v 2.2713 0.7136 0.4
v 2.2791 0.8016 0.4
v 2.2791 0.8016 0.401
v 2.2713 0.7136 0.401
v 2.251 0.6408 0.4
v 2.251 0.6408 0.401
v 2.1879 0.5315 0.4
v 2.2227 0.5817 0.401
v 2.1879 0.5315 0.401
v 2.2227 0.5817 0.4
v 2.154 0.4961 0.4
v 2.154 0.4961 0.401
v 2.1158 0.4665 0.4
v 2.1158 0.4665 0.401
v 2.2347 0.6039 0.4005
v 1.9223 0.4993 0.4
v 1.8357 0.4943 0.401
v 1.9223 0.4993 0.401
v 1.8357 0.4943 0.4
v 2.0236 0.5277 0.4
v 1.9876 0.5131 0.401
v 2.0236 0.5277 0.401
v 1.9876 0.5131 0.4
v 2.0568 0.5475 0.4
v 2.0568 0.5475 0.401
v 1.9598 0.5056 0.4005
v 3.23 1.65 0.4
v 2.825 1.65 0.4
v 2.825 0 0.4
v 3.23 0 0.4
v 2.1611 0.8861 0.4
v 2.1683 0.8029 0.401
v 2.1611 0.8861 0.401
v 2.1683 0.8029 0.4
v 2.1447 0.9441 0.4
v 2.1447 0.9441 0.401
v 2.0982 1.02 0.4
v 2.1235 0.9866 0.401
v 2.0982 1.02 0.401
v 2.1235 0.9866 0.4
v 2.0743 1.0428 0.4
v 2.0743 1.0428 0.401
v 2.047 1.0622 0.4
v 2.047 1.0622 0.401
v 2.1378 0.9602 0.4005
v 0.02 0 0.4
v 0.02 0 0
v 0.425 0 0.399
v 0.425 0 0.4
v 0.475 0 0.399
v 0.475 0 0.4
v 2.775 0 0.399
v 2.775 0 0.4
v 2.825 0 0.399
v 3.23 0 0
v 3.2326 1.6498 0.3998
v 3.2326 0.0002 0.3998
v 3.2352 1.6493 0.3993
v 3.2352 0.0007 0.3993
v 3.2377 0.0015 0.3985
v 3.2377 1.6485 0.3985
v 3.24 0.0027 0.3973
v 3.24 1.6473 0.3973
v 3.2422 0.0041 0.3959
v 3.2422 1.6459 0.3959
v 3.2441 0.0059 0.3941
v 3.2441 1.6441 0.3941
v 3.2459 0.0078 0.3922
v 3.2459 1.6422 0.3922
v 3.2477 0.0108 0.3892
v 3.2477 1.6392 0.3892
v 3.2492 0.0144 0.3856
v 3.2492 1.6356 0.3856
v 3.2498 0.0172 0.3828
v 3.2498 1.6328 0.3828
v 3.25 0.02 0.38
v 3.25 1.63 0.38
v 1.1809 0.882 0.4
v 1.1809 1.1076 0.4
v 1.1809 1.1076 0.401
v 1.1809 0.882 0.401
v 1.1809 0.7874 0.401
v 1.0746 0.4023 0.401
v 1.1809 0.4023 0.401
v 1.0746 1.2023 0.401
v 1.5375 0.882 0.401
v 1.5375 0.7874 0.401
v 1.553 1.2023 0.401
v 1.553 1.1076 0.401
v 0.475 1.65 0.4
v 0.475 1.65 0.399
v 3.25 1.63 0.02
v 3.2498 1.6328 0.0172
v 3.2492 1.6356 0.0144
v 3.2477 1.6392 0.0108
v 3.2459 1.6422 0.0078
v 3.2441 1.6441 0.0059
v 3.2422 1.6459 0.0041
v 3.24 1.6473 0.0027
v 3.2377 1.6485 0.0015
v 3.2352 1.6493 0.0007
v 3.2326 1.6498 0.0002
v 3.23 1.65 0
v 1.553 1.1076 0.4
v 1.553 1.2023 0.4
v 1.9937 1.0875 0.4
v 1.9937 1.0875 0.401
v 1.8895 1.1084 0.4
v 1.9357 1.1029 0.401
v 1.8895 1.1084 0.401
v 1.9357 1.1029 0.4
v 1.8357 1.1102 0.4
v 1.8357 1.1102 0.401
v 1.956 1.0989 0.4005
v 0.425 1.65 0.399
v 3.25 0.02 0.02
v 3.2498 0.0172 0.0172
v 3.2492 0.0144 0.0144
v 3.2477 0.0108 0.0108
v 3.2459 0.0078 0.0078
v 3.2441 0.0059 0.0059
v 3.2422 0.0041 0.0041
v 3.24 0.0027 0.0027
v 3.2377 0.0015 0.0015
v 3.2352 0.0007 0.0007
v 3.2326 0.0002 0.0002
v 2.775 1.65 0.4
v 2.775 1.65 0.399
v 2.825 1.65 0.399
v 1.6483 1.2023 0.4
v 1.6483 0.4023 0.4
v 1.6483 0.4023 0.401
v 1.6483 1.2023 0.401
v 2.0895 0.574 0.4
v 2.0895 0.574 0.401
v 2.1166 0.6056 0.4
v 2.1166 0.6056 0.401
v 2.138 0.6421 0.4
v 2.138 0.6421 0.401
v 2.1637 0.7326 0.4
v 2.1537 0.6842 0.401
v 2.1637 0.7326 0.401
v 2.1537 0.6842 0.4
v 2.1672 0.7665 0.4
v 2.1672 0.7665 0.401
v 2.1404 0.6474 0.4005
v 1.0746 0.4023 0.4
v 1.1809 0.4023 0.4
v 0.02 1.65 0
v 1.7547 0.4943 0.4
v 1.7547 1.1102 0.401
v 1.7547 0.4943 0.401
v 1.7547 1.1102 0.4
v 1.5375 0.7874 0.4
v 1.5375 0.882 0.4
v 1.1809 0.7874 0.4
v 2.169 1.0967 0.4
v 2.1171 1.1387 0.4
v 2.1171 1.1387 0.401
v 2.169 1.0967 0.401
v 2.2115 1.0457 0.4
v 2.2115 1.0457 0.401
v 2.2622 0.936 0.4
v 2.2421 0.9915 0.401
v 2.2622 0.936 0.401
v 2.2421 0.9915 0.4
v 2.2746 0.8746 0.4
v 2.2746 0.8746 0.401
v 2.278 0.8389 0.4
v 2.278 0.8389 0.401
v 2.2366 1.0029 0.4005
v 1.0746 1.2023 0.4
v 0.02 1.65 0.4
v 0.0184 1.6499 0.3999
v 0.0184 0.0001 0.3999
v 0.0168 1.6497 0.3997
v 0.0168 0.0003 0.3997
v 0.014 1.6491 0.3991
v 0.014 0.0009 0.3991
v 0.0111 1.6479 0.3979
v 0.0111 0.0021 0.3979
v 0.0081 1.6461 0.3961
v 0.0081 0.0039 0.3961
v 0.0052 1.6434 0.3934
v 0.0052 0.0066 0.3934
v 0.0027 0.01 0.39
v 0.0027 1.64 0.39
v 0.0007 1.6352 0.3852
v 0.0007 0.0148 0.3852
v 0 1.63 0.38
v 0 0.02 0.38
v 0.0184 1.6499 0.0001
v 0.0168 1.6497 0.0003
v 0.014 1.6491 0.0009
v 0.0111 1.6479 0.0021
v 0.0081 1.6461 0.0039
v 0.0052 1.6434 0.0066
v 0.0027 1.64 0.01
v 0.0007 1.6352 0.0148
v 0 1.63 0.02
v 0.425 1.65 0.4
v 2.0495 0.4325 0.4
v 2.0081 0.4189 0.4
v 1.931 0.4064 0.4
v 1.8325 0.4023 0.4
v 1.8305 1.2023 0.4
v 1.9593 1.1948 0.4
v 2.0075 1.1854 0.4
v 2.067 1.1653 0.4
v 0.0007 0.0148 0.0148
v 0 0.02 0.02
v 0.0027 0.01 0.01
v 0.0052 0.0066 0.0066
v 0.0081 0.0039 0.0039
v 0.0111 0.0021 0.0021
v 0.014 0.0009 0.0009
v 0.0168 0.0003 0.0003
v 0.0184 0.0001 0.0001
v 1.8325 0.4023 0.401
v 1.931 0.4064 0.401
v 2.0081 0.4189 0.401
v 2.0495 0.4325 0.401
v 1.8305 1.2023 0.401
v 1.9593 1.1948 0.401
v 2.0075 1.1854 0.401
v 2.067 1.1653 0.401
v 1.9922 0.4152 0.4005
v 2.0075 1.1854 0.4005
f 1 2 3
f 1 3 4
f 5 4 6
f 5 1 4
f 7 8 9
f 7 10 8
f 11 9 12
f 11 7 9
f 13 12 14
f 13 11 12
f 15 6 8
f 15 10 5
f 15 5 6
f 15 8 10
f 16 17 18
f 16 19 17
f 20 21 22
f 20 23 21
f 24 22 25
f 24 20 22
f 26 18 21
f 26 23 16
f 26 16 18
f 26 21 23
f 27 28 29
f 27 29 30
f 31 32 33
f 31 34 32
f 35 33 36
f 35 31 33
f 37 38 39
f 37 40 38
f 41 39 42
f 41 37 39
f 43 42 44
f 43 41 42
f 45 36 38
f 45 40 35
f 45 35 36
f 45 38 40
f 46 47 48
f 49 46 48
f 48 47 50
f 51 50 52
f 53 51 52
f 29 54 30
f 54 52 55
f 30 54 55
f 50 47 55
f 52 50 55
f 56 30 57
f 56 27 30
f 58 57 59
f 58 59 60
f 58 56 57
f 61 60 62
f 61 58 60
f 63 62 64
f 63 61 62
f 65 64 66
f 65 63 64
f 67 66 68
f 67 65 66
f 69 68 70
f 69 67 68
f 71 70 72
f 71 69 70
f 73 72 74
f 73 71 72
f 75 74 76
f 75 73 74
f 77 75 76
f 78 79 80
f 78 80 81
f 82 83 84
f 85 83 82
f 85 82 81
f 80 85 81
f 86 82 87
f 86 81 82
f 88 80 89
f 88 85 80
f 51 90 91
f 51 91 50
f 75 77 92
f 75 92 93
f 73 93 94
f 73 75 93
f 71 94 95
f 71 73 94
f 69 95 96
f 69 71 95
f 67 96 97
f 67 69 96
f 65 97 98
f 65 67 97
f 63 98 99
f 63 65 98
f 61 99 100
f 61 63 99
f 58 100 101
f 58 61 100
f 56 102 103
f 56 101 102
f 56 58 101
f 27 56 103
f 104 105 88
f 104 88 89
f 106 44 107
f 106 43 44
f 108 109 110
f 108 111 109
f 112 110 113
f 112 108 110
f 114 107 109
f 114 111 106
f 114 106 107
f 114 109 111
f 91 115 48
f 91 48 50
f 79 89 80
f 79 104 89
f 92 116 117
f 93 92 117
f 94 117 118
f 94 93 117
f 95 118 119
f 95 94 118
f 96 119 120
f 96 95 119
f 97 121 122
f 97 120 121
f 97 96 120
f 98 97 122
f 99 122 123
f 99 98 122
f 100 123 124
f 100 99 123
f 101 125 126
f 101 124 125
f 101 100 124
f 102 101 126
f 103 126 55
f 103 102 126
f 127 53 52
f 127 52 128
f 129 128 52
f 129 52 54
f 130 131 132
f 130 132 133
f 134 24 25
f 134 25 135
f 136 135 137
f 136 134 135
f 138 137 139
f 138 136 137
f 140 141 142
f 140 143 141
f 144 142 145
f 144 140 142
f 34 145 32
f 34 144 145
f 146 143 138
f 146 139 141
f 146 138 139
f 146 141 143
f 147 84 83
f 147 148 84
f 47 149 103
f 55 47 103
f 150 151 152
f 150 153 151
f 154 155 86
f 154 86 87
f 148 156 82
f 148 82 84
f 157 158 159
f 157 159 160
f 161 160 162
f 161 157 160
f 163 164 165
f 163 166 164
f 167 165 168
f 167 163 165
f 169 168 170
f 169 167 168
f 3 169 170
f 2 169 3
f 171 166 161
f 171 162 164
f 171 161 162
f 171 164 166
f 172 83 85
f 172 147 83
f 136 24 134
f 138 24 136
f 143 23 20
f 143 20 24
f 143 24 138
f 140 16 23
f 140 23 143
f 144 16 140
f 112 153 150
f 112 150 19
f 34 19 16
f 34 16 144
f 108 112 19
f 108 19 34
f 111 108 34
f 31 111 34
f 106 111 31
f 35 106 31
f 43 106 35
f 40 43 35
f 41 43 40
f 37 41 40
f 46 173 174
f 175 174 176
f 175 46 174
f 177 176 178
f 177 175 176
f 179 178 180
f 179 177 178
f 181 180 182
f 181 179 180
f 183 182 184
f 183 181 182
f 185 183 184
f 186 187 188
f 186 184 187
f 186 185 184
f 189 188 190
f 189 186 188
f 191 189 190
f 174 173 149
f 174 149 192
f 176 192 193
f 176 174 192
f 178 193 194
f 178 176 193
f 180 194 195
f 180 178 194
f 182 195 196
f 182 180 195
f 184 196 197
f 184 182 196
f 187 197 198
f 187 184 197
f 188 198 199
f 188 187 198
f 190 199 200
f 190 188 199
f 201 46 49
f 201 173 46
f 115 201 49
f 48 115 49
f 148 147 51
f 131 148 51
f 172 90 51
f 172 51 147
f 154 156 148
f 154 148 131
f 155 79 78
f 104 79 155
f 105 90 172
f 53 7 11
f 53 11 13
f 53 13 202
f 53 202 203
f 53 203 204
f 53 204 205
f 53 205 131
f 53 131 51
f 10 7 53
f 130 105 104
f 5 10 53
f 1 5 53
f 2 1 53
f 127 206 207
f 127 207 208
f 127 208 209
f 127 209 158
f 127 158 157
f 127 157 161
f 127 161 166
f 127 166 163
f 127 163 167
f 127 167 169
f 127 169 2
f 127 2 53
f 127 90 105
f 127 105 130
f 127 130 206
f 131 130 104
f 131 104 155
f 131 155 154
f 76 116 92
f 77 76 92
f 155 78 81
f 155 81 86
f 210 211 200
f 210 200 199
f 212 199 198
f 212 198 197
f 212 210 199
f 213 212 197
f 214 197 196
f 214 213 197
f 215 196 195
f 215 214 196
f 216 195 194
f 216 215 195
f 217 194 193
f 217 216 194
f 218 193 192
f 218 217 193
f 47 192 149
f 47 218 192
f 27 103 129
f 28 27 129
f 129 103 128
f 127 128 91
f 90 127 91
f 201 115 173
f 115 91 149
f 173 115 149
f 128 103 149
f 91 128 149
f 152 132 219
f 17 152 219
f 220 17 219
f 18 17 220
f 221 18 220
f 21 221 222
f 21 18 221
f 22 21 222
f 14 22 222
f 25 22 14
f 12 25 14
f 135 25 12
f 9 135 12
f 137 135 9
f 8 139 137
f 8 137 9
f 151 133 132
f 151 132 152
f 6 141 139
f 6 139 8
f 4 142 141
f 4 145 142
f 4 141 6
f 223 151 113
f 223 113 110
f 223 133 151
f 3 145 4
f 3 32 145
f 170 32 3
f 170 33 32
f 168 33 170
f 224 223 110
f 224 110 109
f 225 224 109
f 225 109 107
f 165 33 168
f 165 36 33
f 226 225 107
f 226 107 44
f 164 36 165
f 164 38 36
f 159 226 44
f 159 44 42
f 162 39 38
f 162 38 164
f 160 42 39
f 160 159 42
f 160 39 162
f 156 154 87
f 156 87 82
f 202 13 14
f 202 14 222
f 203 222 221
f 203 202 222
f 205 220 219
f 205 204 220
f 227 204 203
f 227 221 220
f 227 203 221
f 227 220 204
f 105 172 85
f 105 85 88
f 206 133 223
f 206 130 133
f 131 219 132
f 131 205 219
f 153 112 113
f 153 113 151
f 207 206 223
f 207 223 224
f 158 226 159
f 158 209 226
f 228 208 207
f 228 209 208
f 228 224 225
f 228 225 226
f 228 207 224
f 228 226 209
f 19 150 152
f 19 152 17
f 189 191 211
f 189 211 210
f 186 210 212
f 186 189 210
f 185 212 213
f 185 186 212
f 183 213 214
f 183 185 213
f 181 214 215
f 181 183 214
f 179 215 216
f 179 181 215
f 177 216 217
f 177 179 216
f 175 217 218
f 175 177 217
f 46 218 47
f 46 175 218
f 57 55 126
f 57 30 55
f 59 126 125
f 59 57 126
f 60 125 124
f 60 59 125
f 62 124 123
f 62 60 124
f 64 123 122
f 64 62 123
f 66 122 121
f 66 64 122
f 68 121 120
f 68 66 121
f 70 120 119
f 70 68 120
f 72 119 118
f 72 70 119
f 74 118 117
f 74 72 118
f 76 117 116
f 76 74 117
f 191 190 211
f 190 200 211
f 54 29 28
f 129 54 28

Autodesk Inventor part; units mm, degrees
ref_plane "YZ Plane" through (0, 0, 0) normal (1, 0, 0) x (0, 1, 0)
ref_plane "XZ Plane" through (0, 0, 0) normal (0, 1, 0) x (-1, 0, 0)
ref_plane "XY Plane" through (0, 0, 0) normal (0, 0, 1) x (1, 0, 0)
sketch "Sketch1" plane through (0, 0, 0) normal (0, 0, 1) x (1, 0, 0)
  line L0 (0, 0) -> (3.25, 0)
  line L1 (3.25, 0) -> (3.25, 1.65)
  line L2 (3.25, 1.65) -> (0, 1.65)
  line L3 (0, 1.65) -> (0, 0)
  dimension "d0" = 1.65
  dimension "d1" = 3.25
extrude "Extrusion1" add sketch "Sketch1" along normal blind 0.4
sketch "Sketch2" plane through (0, 0, 0.4) normal (0, 0, 1) x (1, 0, 0)
  line L0 (0, 0) -> (0, 1.65) projected
  line L1 (3.25, 0) -> (0, 0) projected
  line L2 (0, 1.65) -> (3.25, 1.65) projected
  line L3 (0.425, 1.65) -> (0.425, 0)
  line L4 (0.475, 1.65) -> (0.475, 0)
  line L5 (0.425, 1.65) -> (0.475, 1.65)
  line L6 (0.425, 0) -> (0.475, 0)
  dimension "d4" = 0.425
  dimension "d7" = 0.05
extrude "Extrusion2" cut sketch "Sketch2" against normal blind 0.001 contours L3 L2 L4 L1
ref_plane "Work Plane1" through (1.625, 0, 0) normal (1, 0, 0) x (0, 0, -1)
mirror "Mirror1" about plane through (1.625, 0, 0) normal (1, 0, 0) of "Extrusion2"
sketch "Sketch3" plane through (0, 0, 0.4) normal (0, 0, 1) x (1, 0, 0)
  line L0 (0.9936, 1.2023) -> (2.3385, 1.2023) construction
  line L1 (2.3385, 1.2023) -> (2.3385, 0.3392) construction
  line L2 (2.3385, 0.3392) -> (0.9936, 0.3392) construction
  line L3 (0.9936, 0.3392) -> (0.9936, 1.2023) construction
  line L4 (1.553, 1.1076) -> (1.1809, 1.1076)
  line L5 (1.1809, 1.1076) -> (1.1809, 0.882)
  line L6 (1.1809, 0.882) -> (1.5375, 0.882)
  line L7 (1.5375, 0.882) -> (1.5375, 0.7874)
  line L8 (1.5375, 0.7874) -> (1.1809, 0.7874)
  line L9 (1.1809, 0.7874) -> (1.1809, 0.4023)
  line L10 (1.1809, 0.4023) -> (1.0746, 0.4023)
  line L11 (1.0746, 0.4023) -> (1.0746, 1.2023)
  line L12 (1.0746, 1.2023) -> (1.553, 1.2023)
  line L13 (1.553, 1.2023) -> (1.553, 1.1076)
  spline S0 degree 2 poles (2.2791, 0.8016) (2.2791, 0.6921) (2.1903, 0.5157) (2.1158, 0.4665) knots 0 0 0 1 2 2 2
  spline S1 degree 2 poles (2.1158, 0.4665) (2.0548, 0.4282) (1.9297, 0.4023) (1.8325, 0.4023) knots 0 0 0 1 2 2 2
  line L14 (1.8325, 0.4023) -> (1.6483, 0.4023)
  line L15 (1.6483, 0.4023) -> (1.6483, 1.2023)
  line L16 (1.6483, 1.2023) -> (1.8305, 1.2023)
  spline S2 degree 2 poles (1.8305, 1.2023) (1.9433, 1.2023) (2.0717, 1.1686) (2.1171, 1.1387) knots 0 0 0 1 2 2 2
  spline S3 degree 2 poles (2.1171, 1.1387) (2.1942, 1.0875) (2.2791, 0.9183) (2.2791, 0.8016) knots 0 0 0 1 2 2 2
  spline S4 degree 2 poles (2.1683, 0.8029) (2.1683, 0.895) (2.1073, 1.0253) (2.047, 1.0622) knots 0 0 0 1 2 2 2
  spline S5 degree 2 poles (2.047, 1.0622) (2.0043, 1.0875) (1.9077, 1.1102) (1.8357, 1.1102) knots 0 0 0 1 2 2 2
  line L17 (1.8357, 1.1102) -> (1.7547, 1.1102)
  line L18 (1.7547, 1.1102) -> (1.7547, 0.4943)
  line L19 (1.7547, 0.4943) -> (1.8357, 0.4943)
  spline S6 degree 2 poles (1.8357, 0.4943) (1.9064, 0.4943) (2.0133, 0.517) (2.0568, 0.5475) knots 0 0 0 1 2 2 2
  spline S7 degree 2 poles (2.0568, 0.5475) (2.1125, 0.5851) (2.1683, 0.7096) (2.1683, 0.8029) knots 0 0 0 1 2 2 2
  point P0 (0, 0)
fillet "Fillet1" radius 0.02 8 edges at (3.25, 0.825, 0.4) (3.25, 0, 0.2) (3.25, 0.825, 0) (3.25, 1.65, 0.2) (0, 0.825, 0.4) (0, 1.65, 0.2) (0, 0.825, 0) (0, 0, 0.2)
extrude "Extrusion3" add sketch "Sketch3" along normal blind 0.001
properties part number "fuse"
